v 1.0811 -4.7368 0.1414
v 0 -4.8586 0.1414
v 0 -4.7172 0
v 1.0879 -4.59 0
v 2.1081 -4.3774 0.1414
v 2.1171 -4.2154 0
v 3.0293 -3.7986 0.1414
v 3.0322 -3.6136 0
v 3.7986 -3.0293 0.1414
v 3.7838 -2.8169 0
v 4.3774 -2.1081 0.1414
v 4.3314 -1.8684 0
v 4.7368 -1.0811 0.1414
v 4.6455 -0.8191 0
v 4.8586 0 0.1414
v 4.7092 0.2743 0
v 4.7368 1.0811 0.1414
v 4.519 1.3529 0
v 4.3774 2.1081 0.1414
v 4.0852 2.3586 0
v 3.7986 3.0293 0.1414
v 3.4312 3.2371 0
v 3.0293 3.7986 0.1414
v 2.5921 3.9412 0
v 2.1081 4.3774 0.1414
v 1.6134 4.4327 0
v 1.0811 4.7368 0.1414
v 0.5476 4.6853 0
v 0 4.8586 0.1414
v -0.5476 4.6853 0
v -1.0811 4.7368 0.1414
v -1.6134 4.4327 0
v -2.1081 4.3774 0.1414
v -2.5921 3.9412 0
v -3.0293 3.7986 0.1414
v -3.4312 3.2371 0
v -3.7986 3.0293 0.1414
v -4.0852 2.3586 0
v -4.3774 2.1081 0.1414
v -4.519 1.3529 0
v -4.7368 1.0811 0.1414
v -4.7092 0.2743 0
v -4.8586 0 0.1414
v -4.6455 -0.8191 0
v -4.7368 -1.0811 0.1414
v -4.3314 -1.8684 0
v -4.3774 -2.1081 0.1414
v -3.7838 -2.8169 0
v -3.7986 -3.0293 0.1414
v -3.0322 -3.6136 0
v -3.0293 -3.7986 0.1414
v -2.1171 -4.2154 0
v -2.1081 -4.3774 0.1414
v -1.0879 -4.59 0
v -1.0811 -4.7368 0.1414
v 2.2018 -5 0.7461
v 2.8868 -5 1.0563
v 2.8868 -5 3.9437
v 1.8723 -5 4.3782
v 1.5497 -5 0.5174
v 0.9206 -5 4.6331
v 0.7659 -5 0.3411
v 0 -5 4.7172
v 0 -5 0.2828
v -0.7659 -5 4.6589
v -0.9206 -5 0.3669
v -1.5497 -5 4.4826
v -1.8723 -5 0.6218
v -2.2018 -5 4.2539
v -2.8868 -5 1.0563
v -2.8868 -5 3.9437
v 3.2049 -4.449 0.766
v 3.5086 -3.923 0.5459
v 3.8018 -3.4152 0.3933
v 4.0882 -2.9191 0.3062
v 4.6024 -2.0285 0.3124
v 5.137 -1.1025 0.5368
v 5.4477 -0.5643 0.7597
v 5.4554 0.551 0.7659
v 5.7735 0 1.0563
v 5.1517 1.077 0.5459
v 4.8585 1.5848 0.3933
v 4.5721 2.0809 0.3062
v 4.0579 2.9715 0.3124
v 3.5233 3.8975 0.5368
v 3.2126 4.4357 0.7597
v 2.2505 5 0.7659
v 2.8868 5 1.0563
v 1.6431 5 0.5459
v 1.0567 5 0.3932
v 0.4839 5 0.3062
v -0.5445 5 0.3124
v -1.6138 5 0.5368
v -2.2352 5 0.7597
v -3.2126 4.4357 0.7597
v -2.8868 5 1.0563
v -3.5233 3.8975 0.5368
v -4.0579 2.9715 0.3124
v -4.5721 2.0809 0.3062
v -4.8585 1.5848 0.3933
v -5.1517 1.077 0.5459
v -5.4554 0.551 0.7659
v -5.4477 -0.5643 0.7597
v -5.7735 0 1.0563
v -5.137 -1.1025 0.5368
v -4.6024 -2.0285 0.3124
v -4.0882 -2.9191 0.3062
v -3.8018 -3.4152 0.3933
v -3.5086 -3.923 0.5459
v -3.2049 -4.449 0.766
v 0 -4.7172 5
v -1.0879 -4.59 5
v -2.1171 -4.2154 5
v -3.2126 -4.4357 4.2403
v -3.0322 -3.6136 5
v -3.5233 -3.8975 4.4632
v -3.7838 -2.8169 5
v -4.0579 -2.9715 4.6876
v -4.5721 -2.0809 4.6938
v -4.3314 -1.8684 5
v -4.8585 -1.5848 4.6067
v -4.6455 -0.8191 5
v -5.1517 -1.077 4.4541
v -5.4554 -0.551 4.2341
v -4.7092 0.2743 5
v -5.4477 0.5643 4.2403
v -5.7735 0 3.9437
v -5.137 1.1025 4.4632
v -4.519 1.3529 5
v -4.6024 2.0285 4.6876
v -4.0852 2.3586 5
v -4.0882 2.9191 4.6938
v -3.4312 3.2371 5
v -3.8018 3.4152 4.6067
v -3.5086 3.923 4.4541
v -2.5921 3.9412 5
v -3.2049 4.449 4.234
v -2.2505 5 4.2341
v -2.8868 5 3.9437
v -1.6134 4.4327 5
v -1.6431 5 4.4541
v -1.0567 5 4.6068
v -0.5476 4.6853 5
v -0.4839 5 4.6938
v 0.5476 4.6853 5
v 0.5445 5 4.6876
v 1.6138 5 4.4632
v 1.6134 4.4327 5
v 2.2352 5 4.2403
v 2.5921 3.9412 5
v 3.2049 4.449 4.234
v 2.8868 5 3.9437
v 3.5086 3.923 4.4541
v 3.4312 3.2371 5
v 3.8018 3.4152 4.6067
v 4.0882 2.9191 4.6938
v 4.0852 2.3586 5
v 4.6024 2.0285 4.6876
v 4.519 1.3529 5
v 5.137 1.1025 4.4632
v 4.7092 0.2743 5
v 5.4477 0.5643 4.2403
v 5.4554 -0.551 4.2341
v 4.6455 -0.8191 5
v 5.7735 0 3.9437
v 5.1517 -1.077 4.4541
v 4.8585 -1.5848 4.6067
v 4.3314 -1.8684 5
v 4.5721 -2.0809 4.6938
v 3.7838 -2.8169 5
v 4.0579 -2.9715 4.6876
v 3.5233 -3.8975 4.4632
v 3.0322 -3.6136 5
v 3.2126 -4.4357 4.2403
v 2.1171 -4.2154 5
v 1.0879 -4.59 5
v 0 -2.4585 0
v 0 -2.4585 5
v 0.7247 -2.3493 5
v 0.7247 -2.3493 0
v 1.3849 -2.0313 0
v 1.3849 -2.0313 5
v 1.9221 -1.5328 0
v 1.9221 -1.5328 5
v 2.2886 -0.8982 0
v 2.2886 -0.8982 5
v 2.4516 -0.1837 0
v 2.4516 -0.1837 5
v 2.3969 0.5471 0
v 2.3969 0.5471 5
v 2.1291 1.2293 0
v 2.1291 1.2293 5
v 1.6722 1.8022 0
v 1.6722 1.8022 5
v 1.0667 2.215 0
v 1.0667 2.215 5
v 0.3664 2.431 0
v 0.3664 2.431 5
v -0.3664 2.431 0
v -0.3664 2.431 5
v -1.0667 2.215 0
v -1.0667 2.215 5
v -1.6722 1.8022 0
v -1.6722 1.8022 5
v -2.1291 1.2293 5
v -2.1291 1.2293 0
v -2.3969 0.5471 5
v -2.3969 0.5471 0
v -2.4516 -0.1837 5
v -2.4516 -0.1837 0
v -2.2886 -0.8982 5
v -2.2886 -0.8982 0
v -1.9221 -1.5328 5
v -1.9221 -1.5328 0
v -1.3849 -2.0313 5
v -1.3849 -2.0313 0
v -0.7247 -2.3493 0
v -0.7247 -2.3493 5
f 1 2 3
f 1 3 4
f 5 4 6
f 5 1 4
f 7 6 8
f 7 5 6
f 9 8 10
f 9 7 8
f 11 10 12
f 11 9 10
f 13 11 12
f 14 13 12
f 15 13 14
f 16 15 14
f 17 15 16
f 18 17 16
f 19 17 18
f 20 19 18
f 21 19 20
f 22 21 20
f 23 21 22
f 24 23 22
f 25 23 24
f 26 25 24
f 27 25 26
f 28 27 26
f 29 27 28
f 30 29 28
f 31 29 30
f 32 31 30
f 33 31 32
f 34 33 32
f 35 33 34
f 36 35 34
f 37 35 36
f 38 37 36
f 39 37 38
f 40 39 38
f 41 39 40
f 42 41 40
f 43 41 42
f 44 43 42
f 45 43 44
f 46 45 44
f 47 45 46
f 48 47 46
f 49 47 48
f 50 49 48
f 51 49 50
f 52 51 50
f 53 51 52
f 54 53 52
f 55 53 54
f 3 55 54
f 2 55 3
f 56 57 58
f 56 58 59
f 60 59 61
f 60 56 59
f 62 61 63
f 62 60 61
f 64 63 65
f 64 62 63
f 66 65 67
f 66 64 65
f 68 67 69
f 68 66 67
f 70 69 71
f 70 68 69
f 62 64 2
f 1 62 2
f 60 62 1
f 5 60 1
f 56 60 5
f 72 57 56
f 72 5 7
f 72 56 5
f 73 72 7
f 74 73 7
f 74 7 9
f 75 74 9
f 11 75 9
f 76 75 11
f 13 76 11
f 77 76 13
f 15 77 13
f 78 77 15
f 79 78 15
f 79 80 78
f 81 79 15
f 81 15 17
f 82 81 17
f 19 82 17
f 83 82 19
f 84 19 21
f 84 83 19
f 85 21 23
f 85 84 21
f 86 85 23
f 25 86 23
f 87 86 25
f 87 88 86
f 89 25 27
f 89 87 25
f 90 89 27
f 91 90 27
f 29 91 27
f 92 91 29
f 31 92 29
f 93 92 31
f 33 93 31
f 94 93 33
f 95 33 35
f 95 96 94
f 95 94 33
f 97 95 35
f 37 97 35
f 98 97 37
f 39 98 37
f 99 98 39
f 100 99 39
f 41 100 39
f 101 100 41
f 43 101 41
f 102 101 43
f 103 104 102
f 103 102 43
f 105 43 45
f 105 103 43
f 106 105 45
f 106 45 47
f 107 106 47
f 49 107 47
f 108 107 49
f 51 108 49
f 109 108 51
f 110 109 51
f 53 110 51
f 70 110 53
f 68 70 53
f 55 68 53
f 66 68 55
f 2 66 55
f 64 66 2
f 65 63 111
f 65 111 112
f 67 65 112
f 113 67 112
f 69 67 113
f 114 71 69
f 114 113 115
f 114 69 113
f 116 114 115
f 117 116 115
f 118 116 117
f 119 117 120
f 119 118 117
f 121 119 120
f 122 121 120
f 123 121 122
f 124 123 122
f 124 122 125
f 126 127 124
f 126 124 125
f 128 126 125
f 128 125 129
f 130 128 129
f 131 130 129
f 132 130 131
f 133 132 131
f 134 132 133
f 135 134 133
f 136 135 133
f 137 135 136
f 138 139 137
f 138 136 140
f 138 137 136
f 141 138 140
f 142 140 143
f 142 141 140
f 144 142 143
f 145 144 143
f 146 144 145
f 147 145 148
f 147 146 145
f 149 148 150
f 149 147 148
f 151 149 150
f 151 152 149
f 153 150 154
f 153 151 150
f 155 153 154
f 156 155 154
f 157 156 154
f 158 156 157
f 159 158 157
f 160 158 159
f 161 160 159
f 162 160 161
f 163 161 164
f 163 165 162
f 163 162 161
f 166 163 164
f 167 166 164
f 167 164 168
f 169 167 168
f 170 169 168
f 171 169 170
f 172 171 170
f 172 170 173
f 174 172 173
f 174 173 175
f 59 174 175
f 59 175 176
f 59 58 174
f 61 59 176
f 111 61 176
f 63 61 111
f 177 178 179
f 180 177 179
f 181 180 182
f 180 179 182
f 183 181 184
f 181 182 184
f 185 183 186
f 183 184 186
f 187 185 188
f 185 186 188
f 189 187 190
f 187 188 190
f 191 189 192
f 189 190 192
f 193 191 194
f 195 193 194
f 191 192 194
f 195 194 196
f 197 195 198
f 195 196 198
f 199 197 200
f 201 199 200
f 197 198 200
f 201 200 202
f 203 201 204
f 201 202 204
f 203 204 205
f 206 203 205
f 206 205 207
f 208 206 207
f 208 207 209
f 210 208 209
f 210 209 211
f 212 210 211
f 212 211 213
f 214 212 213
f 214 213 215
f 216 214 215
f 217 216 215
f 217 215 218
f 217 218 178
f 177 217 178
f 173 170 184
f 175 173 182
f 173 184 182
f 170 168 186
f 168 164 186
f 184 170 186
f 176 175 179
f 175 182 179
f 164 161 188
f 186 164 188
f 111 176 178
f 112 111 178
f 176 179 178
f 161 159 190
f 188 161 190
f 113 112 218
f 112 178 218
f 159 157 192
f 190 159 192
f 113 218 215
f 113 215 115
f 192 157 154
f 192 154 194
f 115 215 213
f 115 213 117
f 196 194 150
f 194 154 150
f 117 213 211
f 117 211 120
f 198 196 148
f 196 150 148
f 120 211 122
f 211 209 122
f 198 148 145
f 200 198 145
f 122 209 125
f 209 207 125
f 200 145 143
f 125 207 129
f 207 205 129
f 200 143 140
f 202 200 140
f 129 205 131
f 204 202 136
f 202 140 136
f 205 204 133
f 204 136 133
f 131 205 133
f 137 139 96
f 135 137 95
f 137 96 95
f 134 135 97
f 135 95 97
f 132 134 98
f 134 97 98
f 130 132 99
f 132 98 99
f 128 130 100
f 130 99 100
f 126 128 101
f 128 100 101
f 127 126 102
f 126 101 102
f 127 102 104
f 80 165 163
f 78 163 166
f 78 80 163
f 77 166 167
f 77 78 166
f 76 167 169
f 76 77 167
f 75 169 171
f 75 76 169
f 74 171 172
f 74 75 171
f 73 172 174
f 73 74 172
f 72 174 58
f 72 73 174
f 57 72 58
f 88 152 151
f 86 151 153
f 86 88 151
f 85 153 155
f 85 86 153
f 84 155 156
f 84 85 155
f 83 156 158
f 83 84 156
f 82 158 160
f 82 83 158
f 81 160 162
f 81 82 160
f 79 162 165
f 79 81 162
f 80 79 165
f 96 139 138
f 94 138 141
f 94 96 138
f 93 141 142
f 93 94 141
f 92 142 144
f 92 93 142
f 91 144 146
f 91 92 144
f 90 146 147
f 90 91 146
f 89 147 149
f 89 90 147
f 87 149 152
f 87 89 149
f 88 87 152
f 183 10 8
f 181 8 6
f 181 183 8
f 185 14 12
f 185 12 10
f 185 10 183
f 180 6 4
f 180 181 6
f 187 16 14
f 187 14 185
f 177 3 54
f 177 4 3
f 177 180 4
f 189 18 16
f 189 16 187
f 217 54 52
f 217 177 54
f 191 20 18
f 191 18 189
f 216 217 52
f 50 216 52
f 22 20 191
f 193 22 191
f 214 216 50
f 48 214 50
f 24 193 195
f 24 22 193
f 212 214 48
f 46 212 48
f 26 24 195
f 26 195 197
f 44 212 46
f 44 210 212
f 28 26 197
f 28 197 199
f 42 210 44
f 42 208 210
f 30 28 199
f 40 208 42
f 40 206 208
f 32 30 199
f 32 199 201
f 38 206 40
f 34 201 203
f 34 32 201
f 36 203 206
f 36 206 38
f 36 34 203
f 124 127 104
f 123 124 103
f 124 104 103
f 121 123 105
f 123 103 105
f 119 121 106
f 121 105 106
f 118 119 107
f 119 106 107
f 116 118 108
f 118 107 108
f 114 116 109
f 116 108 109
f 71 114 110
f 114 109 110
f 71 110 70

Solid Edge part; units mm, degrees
sketch "Sketch1" plane through (0, 0, 0) normal (0, 0, 1) x (1, 0, 0)
  line L0 (2.8868, 5) -> (5.7735, 0)
  line L1 (5.7735, 0) -> (2.8868, -5)
  line L2 (2.8868, -5) -> (-2.8868, -5)
  line L3 (-5.7735, 0) -> (-2.8868, -5)
  line L4 (-2.8868, 5) -> (-5.7735, 0)
  line L5 (-2.8868, 5) -> (2.8868, 5)
extrude "Protrusion1" add sketch "Sketch1" along normal blind 5
hole "Hole_1" at (0, 0, 5) direction (0, 0, -1) diameter 4.917 end up to next
sketch "Sketch2" plane through (0, 0, 0) normal (1, 0, 0) x (0, 1, 0)
  line L0 (-4.8586, 4.8586) -> (-3.7954, 5.9218)
  dimension "D1" = 0.2
revolve "RevolvedCutout1" cut sketch "Sketch2" angle 360 about axis through (0, 0, -57) along (0, 0, 1) material side at (0, -4.3624, 5.4256)
mirror "Mirror1" about plane through (0, 0, 2.5) normal (0, 0, 1) of "RevolvedCutout1"
